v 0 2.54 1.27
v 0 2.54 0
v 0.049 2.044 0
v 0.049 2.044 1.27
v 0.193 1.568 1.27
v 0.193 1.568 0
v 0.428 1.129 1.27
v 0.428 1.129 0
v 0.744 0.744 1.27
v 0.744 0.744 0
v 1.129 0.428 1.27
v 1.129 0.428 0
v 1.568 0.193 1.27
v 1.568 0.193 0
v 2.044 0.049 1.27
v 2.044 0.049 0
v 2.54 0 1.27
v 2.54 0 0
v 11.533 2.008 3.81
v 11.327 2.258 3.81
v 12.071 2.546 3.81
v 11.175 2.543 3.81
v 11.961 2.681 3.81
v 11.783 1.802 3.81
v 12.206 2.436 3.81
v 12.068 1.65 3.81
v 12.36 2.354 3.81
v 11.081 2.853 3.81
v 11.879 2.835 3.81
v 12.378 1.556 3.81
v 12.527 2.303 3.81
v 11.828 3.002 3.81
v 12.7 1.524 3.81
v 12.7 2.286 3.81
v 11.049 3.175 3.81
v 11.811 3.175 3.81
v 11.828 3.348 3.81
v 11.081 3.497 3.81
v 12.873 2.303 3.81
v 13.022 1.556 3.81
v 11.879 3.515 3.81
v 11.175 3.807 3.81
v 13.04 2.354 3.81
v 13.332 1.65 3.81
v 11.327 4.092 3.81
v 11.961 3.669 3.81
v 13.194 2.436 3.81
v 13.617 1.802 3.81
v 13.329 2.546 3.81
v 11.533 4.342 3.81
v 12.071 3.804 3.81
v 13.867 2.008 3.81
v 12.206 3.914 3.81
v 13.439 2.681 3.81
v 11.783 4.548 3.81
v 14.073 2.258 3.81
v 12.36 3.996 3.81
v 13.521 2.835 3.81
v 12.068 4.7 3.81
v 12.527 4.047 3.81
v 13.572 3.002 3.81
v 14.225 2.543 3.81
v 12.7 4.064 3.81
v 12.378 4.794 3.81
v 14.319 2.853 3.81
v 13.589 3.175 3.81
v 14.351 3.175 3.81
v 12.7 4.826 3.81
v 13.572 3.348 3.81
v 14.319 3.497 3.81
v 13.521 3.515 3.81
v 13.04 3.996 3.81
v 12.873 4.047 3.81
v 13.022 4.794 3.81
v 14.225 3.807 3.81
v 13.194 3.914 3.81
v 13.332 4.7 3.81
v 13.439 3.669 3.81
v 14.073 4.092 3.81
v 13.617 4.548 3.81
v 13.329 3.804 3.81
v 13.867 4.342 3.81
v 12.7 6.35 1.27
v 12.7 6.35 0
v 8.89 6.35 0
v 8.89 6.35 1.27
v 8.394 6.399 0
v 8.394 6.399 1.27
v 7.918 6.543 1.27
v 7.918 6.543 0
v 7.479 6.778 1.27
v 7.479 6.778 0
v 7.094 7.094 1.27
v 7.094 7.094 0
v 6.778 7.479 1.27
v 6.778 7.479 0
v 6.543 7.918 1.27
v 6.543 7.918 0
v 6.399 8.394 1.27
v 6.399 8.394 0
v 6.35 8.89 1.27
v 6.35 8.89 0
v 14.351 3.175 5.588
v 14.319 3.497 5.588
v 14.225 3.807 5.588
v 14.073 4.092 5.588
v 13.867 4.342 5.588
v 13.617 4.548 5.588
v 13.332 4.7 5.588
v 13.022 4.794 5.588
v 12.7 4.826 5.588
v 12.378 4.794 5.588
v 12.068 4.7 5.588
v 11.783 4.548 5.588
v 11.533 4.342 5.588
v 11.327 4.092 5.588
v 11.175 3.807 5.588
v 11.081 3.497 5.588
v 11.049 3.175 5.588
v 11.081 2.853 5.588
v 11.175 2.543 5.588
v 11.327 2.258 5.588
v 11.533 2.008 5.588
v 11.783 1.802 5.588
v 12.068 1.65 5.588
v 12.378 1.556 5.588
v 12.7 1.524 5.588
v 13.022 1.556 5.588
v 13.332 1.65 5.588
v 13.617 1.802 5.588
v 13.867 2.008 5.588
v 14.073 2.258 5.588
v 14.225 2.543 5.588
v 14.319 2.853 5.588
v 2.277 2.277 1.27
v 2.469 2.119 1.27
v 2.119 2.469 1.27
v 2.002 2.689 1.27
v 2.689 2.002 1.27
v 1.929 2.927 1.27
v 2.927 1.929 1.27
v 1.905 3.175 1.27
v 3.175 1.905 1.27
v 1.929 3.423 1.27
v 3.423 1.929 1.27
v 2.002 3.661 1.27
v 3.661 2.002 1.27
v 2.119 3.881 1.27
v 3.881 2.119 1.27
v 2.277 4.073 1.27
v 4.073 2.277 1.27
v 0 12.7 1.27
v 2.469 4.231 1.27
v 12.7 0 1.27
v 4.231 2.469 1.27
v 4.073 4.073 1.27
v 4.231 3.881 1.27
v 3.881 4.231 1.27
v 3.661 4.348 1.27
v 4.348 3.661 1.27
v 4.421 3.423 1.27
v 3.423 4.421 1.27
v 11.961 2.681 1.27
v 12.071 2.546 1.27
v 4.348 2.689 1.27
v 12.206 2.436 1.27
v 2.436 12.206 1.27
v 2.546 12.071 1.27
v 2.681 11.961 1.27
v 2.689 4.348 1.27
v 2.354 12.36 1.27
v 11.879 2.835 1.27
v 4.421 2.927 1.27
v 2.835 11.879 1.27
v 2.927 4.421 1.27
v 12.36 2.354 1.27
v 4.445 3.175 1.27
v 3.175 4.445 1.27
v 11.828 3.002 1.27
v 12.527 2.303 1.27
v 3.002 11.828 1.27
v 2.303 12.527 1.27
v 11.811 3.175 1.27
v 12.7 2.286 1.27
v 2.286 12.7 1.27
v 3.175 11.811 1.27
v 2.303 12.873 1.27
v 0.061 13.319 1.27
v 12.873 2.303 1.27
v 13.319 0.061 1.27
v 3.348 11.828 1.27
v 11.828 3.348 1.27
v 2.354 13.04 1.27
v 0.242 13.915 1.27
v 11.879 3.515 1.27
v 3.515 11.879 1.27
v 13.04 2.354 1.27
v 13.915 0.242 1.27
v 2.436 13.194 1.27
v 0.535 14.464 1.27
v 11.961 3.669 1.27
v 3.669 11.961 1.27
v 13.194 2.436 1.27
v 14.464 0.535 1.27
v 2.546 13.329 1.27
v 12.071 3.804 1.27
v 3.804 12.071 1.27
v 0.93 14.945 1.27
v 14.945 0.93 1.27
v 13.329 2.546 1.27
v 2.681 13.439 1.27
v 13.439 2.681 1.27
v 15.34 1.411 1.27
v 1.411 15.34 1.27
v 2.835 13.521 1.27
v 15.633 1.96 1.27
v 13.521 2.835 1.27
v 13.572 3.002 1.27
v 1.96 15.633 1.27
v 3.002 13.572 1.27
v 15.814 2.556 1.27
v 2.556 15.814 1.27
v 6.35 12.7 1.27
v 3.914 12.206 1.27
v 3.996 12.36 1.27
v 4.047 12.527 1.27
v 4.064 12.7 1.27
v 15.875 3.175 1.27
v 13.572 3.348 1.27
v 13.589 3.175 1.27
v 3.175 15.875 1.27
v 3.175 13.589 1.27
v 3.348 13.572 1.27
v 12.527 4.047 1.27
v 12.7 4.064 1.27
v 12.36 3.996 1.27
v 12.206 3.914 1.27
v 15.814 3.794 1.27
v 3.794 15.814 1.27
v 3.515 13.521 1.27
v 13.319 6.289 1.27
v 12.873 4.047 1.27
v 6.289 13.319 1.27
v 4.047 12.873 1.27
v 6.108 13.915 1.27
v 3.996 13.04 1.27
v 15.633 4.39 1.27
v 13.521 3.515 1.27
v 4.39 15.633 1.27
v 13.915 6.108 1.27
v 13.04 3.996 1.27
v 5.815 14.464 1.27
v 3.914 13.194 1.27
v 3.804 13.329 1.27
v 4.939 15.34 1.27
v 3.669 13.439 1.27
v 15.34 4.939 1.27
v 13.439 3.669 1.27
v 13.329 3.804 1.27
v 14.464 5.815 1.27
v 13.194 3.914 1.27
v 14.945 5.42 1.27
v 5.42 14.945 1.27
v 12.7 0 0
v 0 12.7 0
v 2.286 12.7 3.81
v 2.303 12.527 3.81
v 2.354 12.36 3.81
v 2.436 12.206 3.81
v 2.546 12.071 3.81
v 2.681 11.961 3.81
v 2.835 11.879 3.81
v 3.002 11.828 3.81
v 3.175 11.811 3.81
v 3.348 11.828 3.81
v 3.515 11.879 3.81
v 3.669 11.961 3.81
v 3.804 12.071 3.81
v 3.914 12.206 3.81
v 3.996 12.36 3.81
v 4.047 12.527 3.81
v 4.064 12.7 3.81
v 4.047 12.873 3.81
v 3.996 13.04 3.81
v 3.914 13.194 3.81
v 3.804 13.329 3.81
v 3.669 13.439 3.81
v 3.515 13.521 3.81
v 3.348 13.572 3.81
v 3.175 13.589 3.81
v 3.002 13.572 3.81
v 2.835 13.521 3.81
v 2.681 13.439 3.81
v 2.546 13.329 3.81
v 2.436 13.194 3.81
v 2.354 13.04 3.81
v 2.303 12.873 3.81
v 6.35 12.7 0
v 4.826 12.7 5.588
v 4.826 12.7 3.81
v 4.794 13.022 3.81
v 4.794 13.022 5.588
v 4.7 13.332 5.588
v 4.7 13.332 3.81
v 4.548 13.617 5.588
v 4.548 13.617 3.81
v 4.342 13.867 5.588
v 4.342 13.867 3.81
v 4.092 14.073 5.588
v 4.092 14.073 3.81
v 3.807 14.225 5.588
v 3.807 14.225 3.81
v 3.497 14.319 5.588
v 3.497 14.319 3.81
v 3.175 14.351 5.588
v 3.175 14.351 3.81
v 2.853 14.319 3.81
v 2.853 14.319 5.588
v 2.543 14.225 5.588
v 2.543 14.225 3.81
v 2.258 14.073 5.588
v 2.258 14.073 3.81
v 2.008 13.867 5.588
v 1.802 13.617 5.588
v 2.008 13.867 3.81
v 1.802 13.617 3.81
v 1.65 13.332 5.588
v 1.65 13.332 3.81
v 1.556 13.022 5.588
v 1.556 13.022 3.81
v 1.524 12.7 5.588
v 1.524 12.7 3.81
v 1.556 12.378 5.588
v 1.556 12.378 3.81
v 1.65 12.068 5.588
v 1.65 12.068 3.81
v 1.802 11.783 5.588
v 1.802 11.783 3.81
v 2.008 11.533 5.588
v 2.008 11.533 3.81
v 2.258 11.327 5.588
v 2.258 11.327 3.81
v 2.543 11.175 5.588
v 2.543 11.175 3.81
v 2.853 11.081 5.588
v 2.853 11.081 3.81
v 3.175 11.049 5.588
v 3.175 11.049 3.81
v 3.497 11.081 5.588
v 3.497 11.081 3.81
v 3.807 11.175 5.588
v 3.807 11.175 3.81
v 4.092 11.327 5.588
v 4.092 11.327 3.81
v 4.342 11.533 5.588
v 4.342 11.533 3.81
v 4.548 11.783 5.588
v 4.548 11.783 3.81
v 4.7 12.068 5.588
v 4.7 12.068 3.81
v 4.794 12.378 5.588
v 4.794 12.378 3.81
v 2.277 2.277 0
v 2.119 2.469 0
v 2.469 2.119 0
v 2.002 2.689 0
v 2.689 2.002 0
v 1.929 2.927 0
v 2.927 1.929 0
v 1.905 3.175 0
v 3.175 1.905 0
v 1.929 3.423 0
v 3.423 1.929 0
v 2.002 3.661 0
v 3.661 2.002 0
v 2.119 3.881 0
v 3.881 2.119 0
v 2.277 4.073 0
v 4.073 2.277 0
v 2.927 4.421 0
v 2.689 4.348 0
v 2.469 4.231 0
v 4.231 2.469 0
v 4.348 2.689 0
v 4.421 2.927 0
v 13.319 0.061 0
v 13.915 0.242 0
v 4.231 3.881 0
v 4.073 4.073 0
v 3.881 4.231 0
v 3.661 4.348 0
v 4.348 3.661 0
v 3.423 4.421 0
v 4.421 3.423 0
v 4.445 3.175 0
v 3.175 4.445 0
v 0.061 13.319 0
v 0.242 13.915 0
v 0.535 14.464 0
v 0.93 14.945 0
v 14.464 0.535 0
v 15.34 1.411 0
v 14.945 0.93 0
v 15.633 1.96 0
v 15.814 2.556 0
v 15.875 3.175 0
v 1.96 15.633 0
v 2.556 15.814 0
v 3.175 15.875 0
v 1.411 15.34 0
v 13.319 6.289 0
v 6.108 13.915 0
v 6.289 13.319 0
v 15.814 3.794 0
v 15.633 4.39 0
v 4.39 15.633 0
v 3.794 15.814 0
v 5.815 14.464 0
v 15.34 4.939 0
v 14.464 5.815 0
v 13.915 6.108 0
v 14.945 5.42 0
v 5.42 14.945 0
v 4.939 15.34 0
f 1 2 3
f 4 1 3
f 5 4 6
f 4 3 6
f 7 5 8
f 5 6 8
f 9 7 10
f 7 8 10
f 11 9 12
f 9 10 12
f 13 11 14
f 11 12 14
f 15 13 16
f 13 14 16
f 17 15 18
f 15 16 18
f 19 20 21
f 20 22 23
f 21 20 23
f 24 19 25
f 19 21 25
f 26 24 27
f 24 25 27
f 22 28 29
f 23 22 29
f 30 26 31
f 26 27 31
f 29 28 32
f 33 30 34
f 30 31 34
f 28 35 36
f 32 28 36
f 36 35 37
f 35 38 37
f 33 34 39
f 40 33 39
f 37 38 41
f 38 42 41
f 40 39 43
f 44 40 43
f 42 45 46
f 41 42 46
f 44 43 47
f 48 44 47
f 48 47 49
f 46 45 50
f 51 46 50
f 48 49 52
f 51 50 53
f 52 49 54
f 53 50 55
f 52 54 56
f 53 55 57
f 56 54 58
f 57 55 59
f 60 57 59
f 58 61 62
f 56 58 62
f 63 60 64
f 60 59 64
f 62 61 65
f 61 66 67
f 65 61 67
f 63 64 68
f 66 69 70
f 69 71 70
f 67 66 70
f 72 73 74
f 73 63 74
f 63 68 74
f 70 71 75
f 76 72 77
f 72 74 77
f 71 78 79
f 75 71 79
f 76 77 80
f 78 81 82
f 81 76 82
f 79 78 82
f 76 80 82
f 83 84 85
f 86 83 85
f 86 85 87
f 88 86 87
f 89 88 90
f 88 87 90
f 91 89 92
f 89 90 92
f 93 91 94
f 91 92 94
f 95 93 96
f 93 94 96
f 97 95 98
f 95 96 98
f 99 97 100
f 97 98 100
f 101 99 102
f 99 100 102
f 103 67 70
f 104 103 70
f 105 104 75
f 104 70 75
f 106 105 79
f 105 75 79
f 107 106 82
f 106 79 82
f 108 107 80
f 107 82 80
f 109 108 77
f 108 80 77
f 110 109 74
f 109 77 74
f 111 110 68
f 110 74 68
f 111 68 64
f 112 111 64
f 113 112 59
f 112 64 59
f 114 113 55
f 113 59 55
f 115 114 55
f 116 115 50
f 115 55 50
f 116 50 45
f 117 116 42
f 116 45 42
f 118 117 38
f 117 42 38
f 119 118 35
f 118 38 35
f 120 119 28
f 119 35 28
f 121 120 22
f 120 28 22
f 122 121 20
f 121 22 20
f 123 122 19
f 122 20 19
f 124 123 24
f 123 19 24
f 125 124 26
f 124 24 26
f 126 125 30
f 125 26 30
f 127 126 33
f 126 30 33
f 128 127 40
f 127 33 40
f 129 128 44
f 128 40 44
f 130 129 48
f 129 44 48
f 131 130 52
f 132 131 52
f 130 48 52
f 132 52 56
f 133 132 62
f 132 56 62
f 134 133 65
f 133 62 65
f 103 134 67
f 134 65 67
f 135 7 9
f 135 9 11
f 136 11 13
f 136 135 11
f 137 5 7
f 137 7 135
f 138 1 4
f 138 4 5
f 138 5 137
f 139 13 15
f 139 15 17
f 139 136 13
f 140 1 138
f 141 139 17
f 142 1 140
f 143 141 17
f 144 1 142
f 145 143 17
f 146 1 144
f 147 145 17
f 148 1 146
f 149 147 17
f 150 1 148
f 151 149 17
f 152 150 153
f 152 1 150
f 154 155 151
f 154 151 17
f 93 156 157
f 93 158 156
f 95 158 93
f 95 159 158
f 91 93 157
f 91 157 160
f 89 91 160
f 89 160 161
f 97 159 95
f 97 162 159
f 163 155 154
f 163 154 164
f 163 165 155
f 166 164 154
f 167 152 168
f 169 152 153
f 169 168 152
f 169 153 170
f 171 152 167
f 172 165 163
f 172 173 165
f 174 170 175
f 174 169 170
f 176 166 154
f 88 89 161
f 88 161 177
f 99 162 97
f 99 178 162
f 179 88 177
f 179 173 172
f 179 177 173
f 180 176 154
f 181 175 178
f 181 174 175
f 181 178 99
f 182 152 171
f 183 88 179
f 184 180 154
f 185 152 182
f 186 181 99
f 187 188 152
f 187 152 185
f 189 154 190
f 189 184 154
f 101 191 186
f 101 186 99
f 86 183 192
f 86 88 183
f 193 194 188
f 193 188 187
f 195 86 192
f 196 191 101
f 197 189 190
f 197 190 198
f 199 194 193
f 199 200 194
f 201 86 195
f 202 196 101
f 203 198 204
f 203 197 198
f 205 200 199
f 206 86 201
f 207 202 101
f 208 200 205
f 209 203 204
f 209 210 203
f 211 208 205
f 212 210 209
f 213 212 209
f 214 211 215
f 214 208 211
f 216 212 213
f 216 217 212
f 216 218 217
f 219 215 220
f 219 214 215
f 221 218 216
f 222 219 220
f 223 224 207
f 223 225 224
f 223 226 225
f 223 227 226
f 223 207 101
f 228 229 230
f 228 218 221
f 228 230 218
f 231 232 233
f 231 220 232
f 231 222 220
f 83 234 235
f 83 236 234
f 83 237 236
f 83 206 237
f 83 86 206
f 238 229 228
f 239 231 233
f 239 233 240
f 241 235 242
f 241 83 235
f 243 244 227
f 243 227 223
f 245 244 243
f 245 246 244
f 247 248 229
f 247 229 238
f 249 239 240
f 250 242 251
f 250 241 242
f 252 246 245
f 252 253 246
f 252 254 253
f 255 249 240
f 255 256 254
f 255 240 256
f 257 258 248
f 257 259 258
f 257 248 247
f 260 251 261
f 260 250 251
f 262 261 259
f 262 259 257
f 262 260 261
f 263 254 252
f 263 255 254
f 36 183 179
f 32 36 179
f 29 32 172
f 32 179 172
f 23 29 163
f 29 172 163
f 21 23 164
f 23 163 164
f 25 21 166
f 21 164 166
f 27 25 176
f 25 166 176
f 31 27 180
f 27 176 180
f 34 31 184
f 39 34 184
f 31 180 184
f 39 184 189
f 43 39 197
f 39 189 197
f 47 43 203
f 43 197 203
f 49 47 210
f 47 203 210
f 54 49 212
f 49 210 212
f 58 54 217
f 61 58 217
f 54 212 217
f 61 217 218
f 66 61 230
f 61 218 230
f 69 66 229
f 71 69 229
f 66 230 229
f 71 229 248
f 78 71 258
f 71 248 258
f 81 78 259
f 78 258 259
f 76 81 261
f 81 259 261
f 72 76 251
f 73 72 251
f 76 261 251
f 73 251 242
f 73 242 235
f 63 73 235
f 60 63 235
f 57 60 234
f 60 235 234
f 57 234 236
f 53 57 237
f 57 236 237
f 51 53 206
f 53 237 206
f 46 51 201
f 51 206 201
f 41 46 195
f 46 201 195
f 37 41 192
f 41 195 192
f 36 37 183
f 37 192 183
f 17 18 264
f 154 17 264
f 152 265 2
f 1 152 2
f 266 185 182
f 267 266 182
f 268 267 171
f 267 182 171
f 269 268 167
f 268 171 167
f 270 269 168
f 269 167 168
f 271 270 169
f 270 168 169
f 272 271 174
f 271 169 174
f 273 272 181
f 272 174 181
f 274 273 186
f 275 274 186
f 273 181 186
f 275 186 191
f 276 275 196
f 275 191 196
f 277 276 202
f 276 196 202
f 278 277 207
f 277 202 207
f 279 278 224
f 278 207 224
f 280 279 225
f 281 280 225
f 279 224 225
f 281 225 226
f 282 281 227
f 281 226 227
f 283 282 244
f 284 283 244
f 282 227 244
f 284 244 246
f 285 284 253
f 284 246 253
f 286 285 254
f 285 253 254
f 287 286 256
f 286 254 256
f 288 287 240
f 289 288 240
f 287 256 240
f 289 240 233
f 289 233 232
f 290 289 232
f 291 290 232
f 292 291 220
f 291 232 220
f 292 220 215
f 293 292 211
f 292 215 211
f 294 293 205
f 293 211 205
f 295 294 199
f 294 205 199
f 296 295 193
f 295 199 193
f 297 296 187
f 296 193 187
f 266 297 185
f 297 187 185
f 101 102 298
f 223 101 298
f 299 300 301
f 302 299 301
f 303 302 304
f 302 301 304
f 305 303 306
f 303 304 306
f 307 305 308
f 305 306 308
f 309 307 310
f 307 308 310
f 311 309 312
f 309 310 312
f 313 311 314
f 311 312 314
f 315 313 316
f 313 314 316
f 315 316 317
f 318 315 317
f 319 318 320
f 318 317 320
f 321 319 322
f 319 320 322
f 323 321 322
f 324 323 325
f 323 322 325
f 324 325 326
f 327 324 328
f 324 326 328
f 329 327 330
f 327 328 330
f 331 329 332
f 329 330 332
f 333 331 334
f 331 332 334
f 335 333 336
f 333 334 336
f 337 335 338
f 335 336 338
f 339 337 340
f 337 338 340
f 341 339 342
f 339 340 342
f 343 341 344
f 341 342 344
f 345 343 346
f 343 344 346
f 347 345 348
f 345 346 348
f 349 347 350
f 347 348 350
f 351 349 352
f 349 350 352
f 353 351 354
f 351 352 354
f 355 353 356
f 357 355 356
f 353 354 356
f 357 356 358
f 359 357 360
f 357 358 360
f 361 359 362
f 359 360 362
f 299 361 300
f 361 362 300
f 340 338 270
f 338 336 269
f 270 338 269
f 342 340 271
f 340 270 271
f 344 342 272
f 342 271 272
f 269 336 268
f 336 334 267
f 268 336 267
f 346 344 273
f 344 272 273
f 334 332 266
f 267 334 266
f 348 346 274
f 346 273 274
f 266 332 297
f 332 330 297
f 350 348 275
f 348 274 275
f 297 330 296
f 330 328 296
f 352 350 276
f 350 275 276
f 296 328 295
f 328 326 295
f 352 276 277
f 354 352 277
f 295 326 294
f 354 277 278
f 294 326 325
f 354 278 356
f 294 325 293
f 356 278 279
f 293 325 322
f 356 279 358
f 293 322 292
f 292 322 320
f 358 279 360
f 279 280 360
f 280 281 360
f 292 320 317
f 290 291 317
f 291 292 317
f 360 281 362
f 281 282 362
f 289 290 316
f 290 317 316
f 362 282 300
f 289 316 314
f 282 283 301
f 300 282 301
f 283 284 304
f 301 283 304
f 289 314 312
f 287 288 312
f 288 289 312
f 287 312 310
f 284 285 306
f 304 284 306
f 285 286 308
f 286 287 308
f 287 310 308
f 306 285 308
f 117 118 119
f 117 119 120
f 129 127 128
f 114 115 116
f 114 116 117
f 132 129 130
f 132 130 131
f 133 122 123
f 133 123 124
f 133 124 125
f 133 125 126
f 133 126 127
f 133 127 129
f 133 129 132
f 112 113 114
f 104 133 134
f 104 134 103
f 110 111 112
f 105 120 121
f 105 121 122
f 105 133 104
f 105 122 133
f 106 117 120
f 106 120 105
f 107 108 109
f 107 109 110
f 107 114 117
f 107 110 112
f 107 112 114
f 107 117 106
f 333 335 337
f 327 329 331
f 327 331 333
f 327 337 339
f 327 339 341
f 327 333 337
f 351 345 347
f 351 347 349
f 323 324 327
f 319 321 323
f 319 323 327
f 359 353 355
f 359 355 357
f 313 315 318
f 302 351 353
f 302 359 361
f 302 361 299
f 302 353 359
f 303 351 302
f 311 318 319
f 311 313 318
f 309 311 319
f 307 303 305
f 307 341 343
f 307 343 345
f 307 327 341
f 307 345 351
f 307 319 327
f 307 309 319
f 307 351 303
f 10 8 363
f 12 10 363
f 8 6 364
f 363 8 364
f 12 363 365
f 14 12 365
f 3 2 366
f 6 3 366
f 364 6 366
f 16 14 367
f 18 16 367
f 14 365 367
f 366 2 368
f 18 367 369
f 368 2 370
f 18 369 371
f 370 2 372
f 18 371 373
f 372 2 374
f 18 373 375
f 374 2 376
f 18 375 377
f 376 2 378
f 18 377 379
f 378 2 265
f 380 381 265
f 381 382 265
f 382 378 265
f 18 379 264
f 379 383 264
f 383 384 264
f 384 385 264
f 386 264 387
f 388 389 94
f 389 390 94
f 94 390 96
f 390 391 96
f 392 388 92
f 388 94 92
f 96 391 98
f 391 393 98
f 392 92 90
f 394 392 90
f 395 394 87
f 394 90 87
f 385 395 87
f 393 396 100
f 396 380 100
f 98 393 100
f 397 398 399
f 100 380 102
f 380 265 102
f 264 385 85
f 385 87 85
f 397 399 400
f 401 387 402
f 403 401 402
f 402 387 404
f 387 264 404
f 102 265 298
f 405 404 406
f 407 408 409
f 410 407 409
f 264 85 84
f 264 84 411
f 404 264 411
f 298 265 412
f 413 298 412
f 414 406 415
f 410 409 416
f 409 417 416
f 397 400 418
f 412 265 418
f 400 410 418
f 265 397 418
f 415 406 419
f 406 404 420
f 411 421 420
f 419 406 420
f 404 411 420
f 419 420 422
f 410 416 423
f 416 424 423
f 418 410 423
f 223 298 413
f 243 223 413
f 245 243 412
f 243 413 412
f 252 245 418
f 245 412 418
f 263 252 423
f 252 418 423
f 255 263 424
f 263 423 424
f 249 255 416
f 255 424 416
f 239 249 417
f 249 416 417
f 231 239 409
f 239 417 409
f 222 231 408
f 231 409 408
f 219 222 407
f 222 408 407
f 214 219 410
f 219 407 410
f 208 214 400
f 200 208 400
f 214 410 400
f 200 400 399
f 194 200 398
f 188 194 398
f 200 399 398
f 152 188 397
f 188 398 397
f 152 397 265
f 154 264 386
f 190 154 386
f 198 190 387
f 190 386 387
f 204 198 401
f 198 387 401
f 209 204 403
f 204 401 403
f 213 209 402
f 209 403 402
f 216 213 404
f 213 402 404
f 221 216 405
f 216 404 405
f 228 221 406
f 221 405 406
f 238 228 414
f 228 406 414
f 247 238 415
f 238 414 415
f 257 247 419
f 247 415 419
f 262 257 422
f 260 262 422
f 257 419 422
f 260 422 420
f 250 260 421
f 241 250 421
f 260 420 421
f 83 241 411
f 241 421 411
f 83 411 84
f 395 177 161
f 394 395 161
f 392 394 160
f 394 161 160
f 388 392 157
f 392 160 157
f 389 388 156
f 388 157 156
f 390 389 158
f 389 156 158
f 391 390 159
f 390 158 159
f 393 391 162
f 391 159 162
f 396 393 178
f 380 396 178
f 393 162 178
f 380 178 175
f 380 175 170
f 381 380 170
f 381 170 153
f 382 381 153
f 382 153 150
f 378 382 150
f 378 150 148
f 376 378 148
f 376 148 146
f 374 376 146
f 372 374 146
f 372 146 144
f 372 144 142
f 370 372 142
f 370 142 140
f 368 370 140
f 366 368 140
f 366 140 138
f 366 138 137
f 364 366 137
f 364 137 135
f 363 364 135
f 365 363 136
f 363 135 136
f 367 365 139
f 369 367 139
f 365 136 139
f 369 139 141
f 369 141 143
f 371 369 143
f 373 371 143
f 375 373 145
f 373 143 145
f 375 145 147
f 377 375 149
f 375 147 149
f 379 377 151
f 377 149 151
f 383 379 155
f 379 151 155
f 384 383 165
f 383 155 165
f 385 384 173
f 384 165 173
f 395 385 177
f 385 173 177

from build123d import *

# Parameters (mm, degrees)
BODY_DEPTH                  = 1.27
SKETCH2_R                   = 0.889
NUBS_DEPTH                  = 2.54
SKETCH3_R                   = 1.651
DON_T_LET_IT_FALL_OFF_DEPTH = 1.778
ATTACH_TO_SIDE_REACH        = 24.862
SKETCH5_R                   = 1.27


with BuildPart() as part:
    # Sketch1 → body (new body)
    with BuildSketch(Plane.XY):
        with BuildLine():
            Line((0, 12.7), (0, 2.54))
            ThreePointArc((0, 2.54), (0.743948776, 0.743948776), (2.54, 0))
            Line((2.54, 0), (12.7, 0))
            ThreePointArc((12.7, 0), (15.875, 3.175), (12.7, 6.35))
            Line((12.7, 6.35), (8.89, 6.35))
            ThreePointArc((8.89, 6.35), (7.093948776, 7.093948776), (6.35, 8.89))
            Line((6.35, 8.89), (6.35, 12.7))
            ThreePointArc((6.35, 12.7), (3.175, 15.875), (0, 12.7))
        make_face()
    extrude(amount=BODY_DEPTH)

    # Sketch2 → nubs (add)
    with BuildSketch(Plane.XY.offset(1.27)):
        with Locations(Location((3.175, 12.7, 0), (0, 0, 180))):
            Circle(SKETCH2_R)
        with Locations(Location((12.7, 3.175, 0), (0, 0, 180))):
            Circle(SKETCH2_R)
    extrude(amount=NUBS_DEPTH)

    # Sketch3 → don't let it fall off (add)
    with BuildSketch(Plane.XY.offset(3.81)):
        with Locations((12.7, 3.175)):
            Circle(SKETCH3_R)
        with Locations((3.175, 12.7)):
            Circle(SKETCH3_R)
    extrude(amount=DON_T_LET_IT_FALL_OFF_DEPTH)

    # Sketch5 → attach to side (cut, up to next)
    with BuildSketch(Plane.XY.offset(1.27), mode=Mode.PRIVATE) as attach_to_side_sk1:
        with Locations((3.175, 3.175)):
            Circle(SKETCH5_R)
    attach_to_side_tool1 = extrude(attach_to_side_sk1.sketch, amount=-ATTACH_TO_SIDE_REACH, mode=Mode.PRIVATE) & part.part
    add(attach_to_side_tool1.solids().sort_by_distance((3.175, 3.175, 1.27))[0], mode=Mode.SUBTRACT)


solid = part.part
